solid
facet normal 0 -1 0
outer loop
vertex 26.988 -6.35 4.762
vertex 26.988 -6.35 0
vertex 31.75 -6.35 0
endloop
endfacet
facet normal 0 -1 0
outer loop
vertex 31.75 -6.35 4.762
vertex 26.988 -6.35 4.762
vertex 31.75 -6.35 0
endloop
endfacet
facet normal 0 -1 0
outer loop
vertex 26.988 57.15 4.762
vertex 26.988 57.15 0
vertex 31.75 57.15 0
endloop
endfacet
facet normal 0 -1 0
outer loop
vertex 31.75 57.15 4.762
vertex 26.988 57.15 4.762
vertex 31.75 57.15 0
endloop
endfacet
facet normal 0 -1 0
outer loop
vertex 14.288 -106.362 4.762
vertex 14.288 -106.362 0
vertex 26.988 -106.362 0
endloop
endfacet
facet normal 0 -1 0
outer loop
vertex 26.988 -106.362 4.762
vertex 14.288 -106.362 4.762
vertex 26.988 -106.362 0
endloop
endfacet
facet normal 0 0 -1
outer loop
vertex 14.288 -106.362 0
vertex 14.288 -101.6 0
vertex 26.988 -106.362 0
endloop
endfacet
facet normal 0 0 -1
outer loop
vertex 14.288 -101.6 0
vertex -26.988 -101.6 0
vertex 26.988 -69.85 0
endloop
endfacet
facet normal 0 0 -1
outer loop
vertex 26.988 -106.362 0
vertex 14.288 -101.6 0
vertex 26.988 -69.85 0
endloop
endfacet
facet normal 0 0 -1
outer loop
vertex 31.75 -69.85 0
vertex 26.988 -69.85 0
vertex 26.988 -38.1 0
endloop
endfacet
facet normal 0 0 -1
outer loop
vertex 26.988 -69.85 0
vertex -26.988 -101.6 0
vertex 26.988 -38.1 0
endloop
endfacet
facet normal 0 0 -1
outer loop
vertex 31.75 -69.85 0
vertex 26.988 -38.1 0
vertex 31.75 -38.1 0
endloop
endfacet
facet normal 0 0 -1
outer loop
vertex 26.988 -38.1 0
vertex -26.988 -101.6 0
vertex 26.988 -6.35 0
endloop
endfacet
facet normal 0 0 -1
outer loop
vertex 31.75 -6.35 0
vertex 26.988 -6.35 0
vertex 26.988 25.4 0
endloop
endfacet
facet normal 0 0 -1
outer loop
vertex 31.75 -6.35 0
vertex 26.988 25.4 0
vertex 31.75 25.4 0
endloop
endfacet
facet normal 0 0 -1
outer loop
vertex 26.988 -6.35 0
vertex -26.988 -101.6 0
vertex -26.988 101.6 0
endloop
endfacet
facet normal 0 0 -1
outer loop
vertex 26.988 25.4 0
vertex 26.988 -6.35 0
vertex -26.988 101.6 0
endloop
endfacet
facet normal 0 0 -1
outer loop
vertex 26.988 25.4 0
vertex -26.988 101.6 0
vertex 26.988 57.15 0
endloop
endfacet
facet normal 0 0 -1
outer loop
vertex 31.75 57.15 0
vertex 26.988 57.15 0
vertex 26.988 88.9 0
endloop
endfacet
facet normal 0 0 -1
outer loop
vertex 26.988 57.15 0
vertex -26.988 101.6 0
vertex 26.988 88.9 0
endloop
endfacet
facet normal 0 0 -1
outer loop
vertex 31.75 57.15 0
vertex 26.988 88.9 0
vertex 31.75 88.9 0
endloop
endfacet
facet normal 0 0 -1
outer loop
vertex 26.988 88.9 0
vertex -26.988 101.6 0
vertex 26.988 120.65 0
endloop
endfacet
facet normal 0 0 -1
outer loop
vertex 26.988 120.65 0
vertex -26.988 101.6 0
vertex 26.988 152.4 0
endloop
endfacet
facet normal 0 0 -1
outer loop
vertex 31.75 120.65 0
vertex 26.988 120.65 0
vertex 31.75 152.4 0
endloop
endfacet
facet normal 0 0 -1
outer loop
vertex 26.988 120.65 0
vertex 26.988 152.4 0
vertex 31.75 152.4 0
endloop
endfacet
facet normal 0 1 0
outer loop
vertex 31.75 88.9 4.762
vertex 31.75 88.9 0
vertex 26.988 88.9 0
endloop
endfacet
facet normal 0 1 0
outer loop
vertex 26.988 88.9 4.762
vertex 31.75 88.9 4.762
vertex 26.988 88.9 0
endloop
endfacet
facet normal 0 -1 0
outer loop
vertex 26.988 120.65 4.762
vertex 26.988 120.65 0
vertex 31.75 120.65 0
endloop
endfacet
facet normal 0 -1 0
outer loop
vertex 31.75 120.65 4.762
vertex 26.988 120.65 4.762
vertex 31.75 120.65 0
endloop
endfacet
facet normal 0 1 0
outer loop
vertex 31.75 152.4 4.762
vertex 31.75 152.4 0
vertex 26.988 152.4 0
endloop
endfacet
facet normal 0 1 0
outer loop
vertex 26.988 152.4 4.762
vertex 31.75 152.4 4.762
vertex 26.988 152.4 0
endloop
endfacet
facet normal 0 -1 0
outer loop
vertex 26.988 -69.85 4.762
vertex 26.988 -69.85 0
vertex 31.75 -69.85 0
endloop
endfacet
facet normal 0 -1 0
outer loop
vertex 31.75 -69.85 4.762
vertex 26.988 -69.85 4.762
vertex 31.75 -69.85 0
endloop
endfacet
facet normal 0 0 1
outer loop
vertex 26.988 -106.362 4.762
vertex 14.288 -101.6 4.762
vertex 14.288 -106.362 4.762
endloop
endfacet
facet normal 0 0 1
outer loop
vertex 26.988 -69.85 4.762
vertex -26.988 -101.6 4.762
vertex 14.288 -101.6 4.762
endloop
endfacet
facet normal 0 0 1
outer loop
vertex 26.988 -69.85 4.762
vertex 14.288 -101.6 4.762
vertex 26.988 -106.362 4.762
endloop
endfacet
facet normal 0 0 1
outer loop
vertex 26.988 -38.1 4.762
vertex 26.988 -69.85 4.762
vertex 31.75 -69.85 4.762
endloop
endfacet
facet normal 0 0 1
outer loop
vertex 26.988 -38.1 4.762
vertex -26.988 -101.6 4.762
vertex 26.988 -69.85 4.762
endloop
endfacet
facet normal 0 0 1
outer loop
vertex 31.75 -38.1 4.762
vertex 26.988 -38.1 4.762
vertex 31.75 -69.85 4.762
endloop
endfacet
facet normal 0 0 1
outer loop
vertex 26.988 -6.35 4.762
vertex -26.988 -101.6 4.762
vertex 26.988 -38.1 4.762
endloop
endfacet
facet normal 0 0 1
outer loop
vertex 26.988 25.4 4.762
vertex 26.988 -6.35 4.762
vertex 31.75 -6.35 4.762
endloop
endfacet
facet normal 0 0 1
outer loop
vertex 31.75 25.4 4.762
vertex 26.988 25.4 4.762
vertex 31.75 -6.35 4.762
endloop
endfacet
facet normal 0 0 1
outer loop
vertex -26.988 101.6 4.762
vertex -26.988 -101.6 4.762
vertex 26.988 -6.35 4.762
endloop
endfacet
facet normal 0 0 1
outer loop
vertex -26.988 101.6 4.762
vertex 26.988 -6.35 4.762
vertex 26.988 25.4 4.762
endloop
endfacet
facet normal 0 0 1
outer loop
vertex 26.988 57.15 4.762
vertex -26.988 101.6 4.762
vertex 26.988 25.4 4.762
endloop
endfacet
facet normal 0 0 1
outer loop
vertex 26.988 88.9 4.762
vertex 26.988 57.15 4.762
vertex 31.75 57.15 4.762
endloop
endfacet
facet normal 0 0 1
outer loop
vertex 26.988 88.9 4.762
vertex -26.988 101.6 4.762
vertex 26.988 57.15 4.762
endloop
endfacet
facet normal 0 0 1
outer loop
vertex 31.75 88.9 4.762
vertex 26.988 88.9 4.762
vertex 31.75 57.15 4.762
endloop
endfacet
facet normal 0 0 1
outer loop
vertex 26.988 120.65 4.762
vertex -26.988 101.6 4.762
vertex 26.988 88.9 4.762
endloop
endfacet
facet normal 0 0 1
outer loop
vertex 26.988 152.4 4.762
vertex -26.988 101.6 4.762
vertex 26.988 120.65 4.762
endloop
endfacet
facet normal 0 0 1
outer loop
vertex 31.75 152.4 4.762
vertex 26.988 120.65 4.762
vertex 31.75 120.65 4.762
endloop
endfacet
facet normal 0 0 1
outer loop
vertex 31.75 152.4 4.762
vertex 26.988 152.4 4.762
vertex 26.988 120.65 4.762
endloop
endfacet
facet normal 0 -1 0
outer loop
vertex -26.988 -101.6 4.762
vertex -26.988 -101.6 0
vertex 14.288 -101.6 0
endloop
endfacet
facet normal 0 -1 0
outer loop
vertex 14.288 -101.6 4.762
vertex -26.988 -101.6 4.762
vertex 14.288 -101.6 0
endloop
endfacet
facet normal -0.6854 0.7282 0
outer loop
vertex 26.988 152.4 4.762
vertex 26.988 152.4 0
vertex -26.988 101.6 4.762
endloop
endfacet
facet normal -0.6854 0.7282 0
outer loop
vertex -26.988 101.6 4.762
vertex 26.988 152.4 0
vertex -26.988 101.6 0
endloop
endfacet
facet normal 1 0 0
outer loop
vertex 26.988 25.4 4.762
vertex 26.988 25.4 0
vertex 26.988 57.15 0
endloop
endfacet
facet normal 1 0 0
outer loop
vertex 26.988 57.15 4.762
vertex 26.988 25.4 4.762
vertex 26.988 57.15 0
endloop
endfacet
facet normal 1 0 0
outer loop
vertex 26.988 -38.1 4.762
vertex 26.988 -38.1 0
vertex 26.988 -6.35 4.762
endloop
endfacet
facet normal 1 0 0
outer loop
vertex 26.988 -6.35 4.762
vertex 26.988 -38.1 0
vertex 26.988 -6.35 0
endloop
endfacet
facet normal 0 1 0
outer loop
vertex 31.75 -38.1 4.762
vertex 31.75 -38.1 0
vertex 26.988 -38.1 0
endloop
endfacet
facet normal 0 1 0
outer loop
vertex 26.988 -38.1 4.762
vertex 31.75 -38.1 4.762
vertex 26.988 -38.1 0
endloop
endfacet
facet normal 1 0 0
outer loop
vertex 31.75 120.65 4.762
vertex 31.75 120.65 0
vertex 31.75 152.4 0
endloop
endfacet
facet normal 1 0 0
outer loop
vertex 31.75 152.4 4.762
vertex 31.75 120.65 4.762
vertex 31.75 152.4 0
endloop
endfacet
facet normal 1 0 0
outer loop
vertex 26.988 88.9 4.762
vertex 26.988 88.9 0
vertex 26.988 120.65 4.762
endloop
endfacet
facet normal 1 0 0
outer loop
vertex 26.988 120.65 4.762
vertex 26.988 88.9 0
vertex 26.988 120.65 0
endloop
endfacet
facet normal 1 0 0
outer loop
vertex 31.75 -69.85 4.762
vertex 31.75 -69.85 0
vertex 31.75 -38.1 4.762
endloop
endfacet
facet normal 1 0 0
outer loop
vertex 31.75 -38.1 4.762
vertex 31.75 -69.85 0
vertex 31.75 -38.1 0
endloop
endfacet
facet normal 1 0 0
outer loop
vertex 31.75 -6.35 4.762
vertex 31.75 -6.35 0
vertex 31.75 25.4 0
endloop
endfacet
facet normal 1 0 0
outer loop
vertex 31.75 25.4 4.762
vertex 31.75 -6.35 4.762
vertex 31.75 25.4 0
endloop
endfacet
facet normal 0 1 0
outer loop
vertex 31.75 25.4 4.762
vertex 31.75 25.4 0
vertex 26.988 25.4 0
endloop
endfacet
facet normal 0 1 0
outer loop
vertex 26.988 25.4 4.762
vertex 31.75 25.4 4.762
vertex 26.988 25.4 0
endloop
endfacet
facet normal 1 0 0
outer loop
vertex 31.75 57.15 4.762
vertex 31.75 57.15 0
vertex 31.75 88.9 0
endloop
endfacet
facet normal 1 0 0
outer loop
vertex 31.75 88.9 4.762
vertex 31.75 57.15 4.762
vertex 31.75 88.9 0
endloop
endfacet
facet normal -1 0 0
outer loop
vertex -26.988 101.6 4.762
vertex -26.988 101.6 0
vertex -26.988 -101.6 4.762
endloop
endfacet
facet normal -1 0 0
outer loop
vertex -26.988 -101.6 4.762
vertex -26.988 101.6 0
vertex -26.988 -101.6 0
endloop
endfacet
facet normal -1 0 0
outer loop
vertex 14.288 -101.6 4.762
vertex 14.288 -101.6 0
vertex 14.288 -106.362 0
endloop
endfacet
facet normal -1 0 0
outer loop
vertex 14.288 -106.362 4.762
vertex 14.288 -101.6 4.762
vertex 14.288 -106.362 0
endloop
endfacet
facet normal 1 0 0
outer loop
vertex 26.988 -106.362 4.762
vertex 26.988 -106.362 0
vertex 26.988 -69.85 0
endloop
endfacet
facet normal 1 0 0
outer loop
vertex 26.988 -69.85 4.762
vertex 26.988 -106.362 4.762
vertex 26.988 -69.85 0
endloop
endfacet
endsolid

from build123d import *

# Parameters (mm, degrees)
BOSS_EXTRUDE1_DEPTH = 4.7625


with BuildPart() as part:
    # Sketch1 → Boss-Extrude1 (new body)
    with BuildSketch(Plane.XY):
        Polygon((-26.9875, -101.6), (14.2875, -101.6), (14.2875, -106.3625), (26.9875, -106.3625), (26.9875, -69.85), (31.75, -69.85), (31.75, -38.1), (26.9875, -38.1), (26.9875, -6.35), (31.75, -6.35), (31.75, 25.4), (26.9875, 25.4), (26.9875, 57.15), (31.75, 57.15), (31.75, 88.9), (26.9875, 88.9), (26.9875, 120.65), (31.75, 120.65), (31.75, 152.4), (26.9875, 152.4), (-26.9875, 101.6), align=None)
    extrude(amount=BOSS_EXTRUDE1_DEPTH)


solid = part.part
